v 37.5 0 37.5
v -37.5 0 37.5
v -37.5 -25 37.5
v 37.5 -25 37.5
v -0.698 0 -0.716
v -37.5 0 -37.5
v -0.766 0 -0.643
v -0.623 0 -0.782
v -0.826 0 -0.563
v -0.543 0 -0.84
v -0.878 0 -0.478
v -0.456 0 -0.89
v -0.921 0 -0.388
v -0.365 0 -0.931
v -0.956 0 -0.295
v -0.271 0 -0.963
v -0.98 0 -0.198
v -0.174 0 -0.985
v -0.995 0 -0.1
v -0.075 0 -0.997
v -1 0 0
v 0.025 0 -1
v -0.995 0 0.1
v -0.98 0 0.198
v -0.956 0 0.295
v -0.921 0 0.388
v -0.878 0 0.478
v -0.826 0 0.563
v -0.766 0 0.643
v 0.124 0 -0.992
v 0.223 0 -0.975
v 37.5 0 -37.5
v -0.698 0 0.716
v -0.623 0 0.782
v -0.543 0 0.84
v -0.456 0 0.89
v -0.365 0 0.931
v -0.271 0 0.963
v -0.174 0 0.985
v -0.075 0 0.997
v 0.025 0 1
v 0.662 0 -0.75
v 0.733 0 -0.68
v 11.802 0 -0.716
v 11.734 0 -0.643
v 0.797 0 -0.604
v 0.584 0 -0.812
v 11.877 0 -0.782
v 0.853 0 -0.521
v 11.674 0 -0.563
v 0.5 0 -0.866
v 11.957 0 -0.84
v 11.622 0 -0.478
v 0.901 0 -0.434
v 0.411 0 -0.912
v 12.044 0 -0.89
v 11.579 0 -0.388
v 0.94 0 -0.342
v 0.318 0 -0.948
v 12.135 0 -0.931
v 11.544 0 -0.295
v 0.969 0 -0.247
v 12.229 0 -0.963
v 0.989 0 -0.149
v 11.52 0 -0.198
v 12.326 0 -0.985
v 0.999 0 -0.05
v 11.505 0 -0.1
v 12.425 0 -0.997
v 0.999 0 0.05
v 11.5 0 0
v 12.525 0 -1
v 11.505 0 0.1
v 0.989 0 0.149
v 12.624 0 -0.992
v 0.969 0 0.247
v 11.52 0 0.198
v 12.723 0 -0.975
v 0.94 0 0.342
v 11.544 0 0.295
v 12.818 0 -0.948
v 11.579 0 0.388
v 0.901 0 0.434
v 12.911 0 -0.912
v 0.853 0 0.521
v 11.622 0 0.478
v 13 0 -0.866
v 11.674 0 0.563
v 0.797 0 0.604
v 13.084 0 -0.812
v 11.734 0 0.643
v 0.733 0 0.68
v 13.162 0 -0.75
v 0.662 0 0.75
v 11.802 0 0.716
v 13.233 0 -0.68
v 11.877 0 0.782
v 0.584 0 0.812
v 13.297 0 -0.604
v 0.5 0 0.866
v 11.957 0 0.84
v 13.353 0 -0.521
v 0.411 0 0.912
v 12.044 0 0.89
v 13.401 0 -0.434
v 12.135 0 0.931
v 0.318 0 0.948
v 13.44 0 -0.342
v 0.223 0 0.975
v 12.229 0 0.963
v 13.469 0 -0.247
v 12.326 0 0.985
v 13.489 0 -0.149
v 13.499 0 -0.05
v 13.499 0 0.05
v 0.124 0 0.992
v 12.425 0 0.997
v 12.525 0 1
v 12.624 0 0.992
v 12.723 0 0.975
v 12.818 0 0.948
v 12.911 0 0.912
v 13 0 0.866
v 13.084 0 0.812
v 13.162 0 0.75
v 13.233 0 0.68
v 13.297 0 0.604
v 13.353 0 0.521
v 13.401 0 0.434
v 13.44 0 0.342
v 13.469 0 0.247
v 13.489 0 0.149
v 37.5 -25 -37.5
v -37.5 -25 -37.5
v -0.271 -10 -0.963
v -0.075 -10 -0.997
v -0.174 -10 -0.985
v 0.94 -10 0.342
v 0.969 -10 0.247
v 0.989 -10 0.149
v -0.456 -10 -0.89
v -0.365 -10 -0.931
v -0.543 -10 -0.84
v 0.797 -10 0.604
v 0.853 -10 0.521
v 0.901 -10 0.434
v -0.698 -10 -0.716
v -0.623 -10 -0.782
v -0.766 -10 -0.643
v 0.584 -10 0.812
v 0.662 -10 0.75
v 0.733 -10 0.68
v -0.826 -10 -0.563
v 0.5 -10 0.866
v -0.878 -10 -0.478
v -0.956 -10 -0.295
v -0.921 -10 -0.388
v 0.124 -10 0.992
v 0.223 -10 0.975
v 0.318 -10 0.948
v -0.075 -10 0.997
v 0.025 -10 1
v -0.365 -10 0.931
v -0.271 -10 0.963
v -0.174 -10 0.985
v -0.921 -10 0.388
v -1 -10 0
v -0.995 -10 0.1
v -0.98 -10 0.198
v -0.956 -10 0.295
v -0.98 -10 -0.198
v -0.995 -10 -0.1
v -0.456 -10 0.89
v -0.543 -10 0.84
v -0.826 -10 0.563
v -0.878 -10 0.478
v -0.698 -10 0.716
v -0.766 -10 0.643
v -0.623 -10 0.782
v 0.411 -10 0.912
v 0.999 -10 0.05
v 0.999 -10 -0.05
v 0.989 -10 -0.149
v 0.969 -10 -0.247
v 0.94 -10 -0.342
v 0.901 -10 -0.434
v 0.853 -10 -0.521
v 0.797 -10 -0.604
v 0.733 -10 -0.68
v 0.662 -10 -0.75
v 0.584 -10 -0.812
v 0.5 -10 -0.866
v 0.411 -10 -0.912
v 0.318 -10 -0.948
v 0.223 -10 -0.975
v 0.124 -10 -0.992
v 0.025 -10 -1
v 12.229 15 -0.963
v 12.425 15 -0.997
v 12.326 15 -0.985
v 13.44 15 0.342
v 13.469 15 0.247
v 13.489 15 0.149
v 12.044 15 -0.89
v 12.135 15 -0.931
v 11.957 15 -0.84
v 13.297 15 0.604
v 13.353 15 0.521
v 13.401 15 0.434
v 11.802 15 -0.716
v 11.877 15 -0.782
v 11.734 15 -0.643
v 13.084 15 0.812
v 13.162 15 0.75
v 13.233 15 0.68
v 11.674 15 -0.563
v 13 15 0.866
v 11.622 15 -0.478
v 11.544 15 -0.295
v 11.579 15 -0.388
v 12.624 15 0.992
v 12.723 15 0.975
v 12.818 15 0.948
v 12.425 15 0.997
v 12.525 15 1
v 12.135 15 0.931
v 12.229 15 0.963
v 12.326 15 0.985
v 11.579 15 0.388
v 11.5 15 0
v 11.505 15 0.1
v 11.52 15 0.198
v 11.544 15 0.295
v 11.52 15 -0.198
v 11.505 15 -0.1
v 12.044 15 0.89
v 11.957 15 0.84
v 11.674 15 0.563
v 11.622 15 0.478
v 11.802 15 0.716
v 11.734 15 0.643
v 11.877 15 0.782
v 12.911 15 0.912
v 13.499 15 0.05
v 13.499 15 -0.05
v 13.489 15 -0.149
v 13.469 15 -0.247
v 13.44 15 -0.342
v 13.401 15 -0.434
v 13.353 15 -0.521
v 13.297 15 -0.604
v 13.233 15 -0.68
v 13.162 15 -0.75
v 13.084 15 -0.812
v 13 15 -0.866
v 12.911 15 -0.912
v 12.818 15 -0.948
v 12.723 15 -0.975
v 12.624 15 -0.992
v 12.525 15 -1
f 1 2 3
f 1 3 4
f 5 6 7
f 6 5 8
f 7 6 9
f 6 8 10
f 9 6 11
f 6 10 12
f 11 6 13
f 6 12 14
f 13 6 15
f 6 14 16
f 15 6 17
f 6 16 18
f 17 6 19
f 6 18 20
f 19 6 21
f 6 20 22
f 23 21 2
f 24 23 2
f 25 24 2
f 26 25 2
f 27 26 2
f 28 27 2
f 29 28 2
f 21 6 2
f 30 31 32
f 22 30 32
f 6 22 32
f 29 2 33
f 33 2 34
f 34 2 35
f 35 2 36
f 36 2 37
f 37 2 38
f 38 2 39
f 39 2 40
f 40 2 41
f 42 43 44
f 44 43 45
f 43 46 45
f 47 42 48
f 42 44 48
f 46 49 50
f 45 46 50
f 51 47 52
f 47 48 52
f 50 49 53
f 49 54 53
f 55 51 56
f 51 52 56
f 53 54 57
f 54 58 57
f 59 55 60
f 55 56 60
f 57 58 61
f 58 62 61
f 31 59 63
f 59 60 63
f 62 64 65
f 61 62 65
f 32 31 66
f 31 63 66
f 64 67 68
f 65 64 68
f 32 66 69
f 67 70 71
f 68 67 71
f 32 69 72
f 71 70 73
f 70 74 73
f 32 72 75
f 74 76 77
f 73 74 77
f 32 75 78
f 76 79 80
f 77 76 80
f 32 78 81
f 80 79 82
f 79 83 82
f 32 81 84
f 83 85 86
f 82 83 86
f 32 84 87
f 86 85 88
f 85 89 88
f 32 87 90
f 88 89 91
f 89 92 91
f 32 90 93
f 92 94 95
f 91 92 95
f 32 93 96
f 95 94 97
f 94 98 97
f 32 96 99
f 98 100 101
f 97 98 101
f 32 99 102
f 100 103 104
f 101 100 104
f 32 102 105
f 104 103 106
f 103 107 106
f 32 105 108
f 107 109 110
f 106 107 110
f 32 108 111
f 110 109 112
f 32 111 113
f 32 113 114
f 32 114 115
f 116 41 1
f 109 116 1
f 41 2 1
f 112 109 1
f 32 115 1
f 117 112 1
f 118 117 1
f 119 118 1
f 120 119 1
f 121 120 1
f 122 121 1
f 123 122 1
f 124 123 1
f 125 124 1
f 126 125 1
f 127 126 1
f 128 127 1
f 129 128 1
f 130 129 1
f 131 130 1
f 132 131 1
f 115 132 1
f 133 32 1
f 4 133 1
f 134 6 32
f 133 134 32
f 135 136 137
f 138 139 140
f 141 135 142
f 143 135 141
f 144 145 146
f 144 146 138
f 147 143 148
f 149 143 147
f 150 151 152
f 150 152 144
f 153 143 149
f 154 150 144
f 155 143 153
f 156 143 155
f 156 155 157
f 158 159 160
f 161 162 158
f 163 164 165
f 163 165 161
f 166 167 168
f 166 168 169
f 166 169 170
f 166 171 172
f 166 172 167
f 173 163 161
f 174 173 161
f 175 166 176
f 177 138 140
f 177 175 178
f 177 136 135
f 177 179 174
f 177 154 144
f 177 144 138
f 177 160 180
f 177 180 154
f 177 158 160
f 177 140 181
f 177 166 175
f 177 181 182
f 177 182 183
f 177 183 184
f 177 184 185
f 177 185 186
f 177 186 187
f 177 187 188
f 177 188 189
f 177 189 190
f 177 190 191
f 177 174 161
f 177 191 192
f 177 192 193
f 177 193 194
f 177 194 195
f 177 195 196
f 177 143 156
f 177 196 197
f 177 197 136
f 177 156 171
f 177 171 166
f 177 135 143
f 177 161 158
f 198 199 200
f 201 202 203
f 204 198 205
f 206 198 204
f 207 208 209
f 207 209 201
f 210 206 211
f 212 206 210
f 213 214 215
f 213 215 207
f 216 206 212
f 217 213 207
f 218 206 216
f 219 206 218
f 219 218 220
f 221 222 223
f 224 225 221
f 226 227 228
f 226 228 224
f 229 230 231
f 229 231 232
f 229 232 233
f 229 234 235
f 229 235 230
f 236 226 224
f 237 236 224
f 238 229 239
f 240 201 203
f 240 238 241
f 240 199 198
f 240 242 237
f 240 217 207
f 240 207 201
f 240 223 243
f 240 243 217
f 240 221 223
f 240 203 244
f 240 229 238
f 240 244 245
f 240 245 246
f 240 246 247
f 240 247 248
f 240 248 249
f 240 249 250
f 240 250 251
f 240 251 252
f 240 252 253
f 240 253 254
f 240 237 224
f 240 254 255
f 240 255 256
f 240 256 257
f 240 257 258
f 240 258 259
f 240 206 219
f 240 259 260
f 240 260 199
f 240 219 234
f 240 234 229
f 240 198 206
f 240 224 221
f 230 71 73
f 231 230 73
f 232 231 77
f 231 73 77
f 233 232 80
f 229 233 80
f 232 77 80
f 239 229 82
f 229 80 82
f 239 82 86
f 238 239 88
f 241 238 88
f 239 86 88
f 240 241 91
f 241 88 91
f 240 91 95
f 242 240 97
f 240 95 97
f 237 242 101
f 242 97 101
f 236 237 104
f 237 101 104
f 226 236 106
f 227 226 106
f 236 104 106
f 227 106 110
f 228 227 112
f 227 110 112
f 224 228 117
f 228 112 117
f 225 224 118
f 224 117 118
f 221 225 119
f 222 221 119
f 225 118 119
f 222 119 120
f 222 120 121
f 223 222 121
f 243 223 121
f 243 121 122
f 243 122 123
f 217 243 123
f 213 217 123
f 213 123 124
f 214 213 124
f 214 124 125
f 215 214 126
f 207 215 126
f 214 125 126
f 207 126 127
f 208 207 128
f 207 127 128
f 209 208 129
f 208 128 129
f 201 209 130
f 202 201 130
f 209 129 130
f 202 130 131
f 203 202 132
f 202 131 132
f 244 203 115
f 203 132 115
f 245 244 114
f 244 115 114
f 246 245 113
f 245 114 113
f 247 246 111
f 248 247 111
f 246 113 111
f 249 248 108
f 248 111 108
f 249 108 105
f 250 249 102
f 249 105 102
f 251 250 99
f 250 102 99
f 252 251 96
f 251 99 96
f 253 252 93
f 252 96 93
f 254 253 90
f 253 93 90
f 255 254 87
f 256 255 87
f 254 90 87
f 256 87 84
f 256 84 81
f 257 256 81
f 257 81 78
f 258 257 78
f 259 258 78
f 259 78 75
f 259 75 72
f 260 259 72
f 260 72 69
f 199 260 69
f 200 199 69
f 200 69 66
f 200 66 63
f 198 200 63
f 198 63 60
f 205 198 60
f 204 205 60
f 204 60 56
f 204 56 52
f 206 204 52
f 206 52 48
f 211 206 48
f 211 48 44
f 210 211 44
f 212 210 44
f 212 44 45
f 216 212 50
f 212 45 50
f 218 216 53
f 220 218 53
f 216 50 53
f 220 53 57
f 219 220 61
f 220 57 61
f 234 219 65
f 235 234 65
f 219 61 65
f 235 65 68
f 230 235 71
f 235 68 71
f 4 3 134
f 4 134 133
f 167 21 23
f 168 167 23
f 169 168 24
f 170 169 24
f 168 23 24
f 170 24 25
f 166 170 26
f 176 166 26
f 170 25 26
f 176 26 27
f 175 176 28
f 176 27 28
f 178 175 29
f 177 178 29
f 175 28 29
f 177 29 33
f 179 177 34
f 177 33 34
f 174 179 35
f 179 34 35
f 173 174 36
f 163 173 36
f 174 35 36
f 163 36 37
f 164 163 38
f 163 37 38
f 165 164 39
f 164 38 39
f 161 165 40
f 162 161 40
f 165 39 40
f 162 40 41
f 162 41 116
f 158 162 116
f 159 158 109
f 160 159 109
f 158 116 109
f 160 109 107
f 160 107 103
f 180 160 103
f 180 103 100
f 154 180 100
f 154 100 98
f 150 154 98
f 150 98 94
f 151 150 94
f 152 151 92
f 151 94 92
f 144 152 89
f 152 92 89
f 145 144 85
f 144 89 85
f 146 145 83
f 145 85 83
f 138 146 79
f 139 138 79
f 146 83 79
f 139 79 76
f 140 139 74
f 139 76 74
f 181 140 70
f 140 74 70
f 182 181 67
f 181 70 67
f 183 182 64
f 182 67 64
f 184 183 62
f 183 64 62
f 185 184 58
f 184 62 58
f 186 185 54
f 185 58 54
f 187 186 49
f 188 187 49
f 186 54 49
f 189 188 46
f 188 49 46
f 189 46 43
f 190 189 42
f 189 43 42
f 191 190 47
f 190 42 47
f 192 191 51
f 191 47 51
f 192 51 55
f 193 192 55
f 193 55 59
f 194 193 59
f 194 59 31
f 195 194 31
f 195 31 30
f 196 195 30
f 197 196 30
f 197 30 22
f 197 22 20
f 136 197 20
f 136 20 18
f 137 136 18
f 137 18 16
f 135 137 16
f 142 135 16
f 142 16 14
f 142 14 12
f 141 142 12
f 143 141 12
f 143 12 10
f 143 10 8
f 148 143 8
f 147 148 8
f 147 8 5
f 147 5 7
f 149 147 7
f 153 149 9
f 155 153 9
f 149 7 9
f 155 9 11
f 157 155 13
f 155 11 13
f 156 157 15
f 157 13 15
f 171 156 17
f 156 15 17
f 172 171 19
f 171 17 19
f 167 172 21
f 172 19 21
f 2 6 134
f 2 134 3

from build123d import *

# Parameters (mm, degrees)
F0_W     = 75
F0_H     = 75
F1_DEPTH = 25
F2_R     = 1
F3_DEPTH = 10
F4_R     = 1
F5_DEPTH = 15


with BuildPart() as f1:
    # F0 (on Front) → F1 (new body)
    with BuildSketch(Plane.XZ):
        Rectangle(F0_W, F0_H)
    extrude(amount=F1_DEPTH)

    # F2 (on face) → F3 (cut)
    with BuildSketch(Plane(origin=(0, 0, 0), x_dir=(-1, 0, 0), z_dir=(0, 1, 0))):
        Circle(F2_R)
    extrude(amount=-F3_DEPTH, mode=Mode.SUBTRACT)

    # F4 (on face) → F5 (join)
    with BuildSketch(Plane(origin=(0, 0, 0), x_dir=(-1, 0, 0), z_dir=(0, 1, 0))):
        with Locations((-12.5, 0)):
            Circle(F4_R)
    extrude(amount=F5_DEPTH)


solid = f1.part
